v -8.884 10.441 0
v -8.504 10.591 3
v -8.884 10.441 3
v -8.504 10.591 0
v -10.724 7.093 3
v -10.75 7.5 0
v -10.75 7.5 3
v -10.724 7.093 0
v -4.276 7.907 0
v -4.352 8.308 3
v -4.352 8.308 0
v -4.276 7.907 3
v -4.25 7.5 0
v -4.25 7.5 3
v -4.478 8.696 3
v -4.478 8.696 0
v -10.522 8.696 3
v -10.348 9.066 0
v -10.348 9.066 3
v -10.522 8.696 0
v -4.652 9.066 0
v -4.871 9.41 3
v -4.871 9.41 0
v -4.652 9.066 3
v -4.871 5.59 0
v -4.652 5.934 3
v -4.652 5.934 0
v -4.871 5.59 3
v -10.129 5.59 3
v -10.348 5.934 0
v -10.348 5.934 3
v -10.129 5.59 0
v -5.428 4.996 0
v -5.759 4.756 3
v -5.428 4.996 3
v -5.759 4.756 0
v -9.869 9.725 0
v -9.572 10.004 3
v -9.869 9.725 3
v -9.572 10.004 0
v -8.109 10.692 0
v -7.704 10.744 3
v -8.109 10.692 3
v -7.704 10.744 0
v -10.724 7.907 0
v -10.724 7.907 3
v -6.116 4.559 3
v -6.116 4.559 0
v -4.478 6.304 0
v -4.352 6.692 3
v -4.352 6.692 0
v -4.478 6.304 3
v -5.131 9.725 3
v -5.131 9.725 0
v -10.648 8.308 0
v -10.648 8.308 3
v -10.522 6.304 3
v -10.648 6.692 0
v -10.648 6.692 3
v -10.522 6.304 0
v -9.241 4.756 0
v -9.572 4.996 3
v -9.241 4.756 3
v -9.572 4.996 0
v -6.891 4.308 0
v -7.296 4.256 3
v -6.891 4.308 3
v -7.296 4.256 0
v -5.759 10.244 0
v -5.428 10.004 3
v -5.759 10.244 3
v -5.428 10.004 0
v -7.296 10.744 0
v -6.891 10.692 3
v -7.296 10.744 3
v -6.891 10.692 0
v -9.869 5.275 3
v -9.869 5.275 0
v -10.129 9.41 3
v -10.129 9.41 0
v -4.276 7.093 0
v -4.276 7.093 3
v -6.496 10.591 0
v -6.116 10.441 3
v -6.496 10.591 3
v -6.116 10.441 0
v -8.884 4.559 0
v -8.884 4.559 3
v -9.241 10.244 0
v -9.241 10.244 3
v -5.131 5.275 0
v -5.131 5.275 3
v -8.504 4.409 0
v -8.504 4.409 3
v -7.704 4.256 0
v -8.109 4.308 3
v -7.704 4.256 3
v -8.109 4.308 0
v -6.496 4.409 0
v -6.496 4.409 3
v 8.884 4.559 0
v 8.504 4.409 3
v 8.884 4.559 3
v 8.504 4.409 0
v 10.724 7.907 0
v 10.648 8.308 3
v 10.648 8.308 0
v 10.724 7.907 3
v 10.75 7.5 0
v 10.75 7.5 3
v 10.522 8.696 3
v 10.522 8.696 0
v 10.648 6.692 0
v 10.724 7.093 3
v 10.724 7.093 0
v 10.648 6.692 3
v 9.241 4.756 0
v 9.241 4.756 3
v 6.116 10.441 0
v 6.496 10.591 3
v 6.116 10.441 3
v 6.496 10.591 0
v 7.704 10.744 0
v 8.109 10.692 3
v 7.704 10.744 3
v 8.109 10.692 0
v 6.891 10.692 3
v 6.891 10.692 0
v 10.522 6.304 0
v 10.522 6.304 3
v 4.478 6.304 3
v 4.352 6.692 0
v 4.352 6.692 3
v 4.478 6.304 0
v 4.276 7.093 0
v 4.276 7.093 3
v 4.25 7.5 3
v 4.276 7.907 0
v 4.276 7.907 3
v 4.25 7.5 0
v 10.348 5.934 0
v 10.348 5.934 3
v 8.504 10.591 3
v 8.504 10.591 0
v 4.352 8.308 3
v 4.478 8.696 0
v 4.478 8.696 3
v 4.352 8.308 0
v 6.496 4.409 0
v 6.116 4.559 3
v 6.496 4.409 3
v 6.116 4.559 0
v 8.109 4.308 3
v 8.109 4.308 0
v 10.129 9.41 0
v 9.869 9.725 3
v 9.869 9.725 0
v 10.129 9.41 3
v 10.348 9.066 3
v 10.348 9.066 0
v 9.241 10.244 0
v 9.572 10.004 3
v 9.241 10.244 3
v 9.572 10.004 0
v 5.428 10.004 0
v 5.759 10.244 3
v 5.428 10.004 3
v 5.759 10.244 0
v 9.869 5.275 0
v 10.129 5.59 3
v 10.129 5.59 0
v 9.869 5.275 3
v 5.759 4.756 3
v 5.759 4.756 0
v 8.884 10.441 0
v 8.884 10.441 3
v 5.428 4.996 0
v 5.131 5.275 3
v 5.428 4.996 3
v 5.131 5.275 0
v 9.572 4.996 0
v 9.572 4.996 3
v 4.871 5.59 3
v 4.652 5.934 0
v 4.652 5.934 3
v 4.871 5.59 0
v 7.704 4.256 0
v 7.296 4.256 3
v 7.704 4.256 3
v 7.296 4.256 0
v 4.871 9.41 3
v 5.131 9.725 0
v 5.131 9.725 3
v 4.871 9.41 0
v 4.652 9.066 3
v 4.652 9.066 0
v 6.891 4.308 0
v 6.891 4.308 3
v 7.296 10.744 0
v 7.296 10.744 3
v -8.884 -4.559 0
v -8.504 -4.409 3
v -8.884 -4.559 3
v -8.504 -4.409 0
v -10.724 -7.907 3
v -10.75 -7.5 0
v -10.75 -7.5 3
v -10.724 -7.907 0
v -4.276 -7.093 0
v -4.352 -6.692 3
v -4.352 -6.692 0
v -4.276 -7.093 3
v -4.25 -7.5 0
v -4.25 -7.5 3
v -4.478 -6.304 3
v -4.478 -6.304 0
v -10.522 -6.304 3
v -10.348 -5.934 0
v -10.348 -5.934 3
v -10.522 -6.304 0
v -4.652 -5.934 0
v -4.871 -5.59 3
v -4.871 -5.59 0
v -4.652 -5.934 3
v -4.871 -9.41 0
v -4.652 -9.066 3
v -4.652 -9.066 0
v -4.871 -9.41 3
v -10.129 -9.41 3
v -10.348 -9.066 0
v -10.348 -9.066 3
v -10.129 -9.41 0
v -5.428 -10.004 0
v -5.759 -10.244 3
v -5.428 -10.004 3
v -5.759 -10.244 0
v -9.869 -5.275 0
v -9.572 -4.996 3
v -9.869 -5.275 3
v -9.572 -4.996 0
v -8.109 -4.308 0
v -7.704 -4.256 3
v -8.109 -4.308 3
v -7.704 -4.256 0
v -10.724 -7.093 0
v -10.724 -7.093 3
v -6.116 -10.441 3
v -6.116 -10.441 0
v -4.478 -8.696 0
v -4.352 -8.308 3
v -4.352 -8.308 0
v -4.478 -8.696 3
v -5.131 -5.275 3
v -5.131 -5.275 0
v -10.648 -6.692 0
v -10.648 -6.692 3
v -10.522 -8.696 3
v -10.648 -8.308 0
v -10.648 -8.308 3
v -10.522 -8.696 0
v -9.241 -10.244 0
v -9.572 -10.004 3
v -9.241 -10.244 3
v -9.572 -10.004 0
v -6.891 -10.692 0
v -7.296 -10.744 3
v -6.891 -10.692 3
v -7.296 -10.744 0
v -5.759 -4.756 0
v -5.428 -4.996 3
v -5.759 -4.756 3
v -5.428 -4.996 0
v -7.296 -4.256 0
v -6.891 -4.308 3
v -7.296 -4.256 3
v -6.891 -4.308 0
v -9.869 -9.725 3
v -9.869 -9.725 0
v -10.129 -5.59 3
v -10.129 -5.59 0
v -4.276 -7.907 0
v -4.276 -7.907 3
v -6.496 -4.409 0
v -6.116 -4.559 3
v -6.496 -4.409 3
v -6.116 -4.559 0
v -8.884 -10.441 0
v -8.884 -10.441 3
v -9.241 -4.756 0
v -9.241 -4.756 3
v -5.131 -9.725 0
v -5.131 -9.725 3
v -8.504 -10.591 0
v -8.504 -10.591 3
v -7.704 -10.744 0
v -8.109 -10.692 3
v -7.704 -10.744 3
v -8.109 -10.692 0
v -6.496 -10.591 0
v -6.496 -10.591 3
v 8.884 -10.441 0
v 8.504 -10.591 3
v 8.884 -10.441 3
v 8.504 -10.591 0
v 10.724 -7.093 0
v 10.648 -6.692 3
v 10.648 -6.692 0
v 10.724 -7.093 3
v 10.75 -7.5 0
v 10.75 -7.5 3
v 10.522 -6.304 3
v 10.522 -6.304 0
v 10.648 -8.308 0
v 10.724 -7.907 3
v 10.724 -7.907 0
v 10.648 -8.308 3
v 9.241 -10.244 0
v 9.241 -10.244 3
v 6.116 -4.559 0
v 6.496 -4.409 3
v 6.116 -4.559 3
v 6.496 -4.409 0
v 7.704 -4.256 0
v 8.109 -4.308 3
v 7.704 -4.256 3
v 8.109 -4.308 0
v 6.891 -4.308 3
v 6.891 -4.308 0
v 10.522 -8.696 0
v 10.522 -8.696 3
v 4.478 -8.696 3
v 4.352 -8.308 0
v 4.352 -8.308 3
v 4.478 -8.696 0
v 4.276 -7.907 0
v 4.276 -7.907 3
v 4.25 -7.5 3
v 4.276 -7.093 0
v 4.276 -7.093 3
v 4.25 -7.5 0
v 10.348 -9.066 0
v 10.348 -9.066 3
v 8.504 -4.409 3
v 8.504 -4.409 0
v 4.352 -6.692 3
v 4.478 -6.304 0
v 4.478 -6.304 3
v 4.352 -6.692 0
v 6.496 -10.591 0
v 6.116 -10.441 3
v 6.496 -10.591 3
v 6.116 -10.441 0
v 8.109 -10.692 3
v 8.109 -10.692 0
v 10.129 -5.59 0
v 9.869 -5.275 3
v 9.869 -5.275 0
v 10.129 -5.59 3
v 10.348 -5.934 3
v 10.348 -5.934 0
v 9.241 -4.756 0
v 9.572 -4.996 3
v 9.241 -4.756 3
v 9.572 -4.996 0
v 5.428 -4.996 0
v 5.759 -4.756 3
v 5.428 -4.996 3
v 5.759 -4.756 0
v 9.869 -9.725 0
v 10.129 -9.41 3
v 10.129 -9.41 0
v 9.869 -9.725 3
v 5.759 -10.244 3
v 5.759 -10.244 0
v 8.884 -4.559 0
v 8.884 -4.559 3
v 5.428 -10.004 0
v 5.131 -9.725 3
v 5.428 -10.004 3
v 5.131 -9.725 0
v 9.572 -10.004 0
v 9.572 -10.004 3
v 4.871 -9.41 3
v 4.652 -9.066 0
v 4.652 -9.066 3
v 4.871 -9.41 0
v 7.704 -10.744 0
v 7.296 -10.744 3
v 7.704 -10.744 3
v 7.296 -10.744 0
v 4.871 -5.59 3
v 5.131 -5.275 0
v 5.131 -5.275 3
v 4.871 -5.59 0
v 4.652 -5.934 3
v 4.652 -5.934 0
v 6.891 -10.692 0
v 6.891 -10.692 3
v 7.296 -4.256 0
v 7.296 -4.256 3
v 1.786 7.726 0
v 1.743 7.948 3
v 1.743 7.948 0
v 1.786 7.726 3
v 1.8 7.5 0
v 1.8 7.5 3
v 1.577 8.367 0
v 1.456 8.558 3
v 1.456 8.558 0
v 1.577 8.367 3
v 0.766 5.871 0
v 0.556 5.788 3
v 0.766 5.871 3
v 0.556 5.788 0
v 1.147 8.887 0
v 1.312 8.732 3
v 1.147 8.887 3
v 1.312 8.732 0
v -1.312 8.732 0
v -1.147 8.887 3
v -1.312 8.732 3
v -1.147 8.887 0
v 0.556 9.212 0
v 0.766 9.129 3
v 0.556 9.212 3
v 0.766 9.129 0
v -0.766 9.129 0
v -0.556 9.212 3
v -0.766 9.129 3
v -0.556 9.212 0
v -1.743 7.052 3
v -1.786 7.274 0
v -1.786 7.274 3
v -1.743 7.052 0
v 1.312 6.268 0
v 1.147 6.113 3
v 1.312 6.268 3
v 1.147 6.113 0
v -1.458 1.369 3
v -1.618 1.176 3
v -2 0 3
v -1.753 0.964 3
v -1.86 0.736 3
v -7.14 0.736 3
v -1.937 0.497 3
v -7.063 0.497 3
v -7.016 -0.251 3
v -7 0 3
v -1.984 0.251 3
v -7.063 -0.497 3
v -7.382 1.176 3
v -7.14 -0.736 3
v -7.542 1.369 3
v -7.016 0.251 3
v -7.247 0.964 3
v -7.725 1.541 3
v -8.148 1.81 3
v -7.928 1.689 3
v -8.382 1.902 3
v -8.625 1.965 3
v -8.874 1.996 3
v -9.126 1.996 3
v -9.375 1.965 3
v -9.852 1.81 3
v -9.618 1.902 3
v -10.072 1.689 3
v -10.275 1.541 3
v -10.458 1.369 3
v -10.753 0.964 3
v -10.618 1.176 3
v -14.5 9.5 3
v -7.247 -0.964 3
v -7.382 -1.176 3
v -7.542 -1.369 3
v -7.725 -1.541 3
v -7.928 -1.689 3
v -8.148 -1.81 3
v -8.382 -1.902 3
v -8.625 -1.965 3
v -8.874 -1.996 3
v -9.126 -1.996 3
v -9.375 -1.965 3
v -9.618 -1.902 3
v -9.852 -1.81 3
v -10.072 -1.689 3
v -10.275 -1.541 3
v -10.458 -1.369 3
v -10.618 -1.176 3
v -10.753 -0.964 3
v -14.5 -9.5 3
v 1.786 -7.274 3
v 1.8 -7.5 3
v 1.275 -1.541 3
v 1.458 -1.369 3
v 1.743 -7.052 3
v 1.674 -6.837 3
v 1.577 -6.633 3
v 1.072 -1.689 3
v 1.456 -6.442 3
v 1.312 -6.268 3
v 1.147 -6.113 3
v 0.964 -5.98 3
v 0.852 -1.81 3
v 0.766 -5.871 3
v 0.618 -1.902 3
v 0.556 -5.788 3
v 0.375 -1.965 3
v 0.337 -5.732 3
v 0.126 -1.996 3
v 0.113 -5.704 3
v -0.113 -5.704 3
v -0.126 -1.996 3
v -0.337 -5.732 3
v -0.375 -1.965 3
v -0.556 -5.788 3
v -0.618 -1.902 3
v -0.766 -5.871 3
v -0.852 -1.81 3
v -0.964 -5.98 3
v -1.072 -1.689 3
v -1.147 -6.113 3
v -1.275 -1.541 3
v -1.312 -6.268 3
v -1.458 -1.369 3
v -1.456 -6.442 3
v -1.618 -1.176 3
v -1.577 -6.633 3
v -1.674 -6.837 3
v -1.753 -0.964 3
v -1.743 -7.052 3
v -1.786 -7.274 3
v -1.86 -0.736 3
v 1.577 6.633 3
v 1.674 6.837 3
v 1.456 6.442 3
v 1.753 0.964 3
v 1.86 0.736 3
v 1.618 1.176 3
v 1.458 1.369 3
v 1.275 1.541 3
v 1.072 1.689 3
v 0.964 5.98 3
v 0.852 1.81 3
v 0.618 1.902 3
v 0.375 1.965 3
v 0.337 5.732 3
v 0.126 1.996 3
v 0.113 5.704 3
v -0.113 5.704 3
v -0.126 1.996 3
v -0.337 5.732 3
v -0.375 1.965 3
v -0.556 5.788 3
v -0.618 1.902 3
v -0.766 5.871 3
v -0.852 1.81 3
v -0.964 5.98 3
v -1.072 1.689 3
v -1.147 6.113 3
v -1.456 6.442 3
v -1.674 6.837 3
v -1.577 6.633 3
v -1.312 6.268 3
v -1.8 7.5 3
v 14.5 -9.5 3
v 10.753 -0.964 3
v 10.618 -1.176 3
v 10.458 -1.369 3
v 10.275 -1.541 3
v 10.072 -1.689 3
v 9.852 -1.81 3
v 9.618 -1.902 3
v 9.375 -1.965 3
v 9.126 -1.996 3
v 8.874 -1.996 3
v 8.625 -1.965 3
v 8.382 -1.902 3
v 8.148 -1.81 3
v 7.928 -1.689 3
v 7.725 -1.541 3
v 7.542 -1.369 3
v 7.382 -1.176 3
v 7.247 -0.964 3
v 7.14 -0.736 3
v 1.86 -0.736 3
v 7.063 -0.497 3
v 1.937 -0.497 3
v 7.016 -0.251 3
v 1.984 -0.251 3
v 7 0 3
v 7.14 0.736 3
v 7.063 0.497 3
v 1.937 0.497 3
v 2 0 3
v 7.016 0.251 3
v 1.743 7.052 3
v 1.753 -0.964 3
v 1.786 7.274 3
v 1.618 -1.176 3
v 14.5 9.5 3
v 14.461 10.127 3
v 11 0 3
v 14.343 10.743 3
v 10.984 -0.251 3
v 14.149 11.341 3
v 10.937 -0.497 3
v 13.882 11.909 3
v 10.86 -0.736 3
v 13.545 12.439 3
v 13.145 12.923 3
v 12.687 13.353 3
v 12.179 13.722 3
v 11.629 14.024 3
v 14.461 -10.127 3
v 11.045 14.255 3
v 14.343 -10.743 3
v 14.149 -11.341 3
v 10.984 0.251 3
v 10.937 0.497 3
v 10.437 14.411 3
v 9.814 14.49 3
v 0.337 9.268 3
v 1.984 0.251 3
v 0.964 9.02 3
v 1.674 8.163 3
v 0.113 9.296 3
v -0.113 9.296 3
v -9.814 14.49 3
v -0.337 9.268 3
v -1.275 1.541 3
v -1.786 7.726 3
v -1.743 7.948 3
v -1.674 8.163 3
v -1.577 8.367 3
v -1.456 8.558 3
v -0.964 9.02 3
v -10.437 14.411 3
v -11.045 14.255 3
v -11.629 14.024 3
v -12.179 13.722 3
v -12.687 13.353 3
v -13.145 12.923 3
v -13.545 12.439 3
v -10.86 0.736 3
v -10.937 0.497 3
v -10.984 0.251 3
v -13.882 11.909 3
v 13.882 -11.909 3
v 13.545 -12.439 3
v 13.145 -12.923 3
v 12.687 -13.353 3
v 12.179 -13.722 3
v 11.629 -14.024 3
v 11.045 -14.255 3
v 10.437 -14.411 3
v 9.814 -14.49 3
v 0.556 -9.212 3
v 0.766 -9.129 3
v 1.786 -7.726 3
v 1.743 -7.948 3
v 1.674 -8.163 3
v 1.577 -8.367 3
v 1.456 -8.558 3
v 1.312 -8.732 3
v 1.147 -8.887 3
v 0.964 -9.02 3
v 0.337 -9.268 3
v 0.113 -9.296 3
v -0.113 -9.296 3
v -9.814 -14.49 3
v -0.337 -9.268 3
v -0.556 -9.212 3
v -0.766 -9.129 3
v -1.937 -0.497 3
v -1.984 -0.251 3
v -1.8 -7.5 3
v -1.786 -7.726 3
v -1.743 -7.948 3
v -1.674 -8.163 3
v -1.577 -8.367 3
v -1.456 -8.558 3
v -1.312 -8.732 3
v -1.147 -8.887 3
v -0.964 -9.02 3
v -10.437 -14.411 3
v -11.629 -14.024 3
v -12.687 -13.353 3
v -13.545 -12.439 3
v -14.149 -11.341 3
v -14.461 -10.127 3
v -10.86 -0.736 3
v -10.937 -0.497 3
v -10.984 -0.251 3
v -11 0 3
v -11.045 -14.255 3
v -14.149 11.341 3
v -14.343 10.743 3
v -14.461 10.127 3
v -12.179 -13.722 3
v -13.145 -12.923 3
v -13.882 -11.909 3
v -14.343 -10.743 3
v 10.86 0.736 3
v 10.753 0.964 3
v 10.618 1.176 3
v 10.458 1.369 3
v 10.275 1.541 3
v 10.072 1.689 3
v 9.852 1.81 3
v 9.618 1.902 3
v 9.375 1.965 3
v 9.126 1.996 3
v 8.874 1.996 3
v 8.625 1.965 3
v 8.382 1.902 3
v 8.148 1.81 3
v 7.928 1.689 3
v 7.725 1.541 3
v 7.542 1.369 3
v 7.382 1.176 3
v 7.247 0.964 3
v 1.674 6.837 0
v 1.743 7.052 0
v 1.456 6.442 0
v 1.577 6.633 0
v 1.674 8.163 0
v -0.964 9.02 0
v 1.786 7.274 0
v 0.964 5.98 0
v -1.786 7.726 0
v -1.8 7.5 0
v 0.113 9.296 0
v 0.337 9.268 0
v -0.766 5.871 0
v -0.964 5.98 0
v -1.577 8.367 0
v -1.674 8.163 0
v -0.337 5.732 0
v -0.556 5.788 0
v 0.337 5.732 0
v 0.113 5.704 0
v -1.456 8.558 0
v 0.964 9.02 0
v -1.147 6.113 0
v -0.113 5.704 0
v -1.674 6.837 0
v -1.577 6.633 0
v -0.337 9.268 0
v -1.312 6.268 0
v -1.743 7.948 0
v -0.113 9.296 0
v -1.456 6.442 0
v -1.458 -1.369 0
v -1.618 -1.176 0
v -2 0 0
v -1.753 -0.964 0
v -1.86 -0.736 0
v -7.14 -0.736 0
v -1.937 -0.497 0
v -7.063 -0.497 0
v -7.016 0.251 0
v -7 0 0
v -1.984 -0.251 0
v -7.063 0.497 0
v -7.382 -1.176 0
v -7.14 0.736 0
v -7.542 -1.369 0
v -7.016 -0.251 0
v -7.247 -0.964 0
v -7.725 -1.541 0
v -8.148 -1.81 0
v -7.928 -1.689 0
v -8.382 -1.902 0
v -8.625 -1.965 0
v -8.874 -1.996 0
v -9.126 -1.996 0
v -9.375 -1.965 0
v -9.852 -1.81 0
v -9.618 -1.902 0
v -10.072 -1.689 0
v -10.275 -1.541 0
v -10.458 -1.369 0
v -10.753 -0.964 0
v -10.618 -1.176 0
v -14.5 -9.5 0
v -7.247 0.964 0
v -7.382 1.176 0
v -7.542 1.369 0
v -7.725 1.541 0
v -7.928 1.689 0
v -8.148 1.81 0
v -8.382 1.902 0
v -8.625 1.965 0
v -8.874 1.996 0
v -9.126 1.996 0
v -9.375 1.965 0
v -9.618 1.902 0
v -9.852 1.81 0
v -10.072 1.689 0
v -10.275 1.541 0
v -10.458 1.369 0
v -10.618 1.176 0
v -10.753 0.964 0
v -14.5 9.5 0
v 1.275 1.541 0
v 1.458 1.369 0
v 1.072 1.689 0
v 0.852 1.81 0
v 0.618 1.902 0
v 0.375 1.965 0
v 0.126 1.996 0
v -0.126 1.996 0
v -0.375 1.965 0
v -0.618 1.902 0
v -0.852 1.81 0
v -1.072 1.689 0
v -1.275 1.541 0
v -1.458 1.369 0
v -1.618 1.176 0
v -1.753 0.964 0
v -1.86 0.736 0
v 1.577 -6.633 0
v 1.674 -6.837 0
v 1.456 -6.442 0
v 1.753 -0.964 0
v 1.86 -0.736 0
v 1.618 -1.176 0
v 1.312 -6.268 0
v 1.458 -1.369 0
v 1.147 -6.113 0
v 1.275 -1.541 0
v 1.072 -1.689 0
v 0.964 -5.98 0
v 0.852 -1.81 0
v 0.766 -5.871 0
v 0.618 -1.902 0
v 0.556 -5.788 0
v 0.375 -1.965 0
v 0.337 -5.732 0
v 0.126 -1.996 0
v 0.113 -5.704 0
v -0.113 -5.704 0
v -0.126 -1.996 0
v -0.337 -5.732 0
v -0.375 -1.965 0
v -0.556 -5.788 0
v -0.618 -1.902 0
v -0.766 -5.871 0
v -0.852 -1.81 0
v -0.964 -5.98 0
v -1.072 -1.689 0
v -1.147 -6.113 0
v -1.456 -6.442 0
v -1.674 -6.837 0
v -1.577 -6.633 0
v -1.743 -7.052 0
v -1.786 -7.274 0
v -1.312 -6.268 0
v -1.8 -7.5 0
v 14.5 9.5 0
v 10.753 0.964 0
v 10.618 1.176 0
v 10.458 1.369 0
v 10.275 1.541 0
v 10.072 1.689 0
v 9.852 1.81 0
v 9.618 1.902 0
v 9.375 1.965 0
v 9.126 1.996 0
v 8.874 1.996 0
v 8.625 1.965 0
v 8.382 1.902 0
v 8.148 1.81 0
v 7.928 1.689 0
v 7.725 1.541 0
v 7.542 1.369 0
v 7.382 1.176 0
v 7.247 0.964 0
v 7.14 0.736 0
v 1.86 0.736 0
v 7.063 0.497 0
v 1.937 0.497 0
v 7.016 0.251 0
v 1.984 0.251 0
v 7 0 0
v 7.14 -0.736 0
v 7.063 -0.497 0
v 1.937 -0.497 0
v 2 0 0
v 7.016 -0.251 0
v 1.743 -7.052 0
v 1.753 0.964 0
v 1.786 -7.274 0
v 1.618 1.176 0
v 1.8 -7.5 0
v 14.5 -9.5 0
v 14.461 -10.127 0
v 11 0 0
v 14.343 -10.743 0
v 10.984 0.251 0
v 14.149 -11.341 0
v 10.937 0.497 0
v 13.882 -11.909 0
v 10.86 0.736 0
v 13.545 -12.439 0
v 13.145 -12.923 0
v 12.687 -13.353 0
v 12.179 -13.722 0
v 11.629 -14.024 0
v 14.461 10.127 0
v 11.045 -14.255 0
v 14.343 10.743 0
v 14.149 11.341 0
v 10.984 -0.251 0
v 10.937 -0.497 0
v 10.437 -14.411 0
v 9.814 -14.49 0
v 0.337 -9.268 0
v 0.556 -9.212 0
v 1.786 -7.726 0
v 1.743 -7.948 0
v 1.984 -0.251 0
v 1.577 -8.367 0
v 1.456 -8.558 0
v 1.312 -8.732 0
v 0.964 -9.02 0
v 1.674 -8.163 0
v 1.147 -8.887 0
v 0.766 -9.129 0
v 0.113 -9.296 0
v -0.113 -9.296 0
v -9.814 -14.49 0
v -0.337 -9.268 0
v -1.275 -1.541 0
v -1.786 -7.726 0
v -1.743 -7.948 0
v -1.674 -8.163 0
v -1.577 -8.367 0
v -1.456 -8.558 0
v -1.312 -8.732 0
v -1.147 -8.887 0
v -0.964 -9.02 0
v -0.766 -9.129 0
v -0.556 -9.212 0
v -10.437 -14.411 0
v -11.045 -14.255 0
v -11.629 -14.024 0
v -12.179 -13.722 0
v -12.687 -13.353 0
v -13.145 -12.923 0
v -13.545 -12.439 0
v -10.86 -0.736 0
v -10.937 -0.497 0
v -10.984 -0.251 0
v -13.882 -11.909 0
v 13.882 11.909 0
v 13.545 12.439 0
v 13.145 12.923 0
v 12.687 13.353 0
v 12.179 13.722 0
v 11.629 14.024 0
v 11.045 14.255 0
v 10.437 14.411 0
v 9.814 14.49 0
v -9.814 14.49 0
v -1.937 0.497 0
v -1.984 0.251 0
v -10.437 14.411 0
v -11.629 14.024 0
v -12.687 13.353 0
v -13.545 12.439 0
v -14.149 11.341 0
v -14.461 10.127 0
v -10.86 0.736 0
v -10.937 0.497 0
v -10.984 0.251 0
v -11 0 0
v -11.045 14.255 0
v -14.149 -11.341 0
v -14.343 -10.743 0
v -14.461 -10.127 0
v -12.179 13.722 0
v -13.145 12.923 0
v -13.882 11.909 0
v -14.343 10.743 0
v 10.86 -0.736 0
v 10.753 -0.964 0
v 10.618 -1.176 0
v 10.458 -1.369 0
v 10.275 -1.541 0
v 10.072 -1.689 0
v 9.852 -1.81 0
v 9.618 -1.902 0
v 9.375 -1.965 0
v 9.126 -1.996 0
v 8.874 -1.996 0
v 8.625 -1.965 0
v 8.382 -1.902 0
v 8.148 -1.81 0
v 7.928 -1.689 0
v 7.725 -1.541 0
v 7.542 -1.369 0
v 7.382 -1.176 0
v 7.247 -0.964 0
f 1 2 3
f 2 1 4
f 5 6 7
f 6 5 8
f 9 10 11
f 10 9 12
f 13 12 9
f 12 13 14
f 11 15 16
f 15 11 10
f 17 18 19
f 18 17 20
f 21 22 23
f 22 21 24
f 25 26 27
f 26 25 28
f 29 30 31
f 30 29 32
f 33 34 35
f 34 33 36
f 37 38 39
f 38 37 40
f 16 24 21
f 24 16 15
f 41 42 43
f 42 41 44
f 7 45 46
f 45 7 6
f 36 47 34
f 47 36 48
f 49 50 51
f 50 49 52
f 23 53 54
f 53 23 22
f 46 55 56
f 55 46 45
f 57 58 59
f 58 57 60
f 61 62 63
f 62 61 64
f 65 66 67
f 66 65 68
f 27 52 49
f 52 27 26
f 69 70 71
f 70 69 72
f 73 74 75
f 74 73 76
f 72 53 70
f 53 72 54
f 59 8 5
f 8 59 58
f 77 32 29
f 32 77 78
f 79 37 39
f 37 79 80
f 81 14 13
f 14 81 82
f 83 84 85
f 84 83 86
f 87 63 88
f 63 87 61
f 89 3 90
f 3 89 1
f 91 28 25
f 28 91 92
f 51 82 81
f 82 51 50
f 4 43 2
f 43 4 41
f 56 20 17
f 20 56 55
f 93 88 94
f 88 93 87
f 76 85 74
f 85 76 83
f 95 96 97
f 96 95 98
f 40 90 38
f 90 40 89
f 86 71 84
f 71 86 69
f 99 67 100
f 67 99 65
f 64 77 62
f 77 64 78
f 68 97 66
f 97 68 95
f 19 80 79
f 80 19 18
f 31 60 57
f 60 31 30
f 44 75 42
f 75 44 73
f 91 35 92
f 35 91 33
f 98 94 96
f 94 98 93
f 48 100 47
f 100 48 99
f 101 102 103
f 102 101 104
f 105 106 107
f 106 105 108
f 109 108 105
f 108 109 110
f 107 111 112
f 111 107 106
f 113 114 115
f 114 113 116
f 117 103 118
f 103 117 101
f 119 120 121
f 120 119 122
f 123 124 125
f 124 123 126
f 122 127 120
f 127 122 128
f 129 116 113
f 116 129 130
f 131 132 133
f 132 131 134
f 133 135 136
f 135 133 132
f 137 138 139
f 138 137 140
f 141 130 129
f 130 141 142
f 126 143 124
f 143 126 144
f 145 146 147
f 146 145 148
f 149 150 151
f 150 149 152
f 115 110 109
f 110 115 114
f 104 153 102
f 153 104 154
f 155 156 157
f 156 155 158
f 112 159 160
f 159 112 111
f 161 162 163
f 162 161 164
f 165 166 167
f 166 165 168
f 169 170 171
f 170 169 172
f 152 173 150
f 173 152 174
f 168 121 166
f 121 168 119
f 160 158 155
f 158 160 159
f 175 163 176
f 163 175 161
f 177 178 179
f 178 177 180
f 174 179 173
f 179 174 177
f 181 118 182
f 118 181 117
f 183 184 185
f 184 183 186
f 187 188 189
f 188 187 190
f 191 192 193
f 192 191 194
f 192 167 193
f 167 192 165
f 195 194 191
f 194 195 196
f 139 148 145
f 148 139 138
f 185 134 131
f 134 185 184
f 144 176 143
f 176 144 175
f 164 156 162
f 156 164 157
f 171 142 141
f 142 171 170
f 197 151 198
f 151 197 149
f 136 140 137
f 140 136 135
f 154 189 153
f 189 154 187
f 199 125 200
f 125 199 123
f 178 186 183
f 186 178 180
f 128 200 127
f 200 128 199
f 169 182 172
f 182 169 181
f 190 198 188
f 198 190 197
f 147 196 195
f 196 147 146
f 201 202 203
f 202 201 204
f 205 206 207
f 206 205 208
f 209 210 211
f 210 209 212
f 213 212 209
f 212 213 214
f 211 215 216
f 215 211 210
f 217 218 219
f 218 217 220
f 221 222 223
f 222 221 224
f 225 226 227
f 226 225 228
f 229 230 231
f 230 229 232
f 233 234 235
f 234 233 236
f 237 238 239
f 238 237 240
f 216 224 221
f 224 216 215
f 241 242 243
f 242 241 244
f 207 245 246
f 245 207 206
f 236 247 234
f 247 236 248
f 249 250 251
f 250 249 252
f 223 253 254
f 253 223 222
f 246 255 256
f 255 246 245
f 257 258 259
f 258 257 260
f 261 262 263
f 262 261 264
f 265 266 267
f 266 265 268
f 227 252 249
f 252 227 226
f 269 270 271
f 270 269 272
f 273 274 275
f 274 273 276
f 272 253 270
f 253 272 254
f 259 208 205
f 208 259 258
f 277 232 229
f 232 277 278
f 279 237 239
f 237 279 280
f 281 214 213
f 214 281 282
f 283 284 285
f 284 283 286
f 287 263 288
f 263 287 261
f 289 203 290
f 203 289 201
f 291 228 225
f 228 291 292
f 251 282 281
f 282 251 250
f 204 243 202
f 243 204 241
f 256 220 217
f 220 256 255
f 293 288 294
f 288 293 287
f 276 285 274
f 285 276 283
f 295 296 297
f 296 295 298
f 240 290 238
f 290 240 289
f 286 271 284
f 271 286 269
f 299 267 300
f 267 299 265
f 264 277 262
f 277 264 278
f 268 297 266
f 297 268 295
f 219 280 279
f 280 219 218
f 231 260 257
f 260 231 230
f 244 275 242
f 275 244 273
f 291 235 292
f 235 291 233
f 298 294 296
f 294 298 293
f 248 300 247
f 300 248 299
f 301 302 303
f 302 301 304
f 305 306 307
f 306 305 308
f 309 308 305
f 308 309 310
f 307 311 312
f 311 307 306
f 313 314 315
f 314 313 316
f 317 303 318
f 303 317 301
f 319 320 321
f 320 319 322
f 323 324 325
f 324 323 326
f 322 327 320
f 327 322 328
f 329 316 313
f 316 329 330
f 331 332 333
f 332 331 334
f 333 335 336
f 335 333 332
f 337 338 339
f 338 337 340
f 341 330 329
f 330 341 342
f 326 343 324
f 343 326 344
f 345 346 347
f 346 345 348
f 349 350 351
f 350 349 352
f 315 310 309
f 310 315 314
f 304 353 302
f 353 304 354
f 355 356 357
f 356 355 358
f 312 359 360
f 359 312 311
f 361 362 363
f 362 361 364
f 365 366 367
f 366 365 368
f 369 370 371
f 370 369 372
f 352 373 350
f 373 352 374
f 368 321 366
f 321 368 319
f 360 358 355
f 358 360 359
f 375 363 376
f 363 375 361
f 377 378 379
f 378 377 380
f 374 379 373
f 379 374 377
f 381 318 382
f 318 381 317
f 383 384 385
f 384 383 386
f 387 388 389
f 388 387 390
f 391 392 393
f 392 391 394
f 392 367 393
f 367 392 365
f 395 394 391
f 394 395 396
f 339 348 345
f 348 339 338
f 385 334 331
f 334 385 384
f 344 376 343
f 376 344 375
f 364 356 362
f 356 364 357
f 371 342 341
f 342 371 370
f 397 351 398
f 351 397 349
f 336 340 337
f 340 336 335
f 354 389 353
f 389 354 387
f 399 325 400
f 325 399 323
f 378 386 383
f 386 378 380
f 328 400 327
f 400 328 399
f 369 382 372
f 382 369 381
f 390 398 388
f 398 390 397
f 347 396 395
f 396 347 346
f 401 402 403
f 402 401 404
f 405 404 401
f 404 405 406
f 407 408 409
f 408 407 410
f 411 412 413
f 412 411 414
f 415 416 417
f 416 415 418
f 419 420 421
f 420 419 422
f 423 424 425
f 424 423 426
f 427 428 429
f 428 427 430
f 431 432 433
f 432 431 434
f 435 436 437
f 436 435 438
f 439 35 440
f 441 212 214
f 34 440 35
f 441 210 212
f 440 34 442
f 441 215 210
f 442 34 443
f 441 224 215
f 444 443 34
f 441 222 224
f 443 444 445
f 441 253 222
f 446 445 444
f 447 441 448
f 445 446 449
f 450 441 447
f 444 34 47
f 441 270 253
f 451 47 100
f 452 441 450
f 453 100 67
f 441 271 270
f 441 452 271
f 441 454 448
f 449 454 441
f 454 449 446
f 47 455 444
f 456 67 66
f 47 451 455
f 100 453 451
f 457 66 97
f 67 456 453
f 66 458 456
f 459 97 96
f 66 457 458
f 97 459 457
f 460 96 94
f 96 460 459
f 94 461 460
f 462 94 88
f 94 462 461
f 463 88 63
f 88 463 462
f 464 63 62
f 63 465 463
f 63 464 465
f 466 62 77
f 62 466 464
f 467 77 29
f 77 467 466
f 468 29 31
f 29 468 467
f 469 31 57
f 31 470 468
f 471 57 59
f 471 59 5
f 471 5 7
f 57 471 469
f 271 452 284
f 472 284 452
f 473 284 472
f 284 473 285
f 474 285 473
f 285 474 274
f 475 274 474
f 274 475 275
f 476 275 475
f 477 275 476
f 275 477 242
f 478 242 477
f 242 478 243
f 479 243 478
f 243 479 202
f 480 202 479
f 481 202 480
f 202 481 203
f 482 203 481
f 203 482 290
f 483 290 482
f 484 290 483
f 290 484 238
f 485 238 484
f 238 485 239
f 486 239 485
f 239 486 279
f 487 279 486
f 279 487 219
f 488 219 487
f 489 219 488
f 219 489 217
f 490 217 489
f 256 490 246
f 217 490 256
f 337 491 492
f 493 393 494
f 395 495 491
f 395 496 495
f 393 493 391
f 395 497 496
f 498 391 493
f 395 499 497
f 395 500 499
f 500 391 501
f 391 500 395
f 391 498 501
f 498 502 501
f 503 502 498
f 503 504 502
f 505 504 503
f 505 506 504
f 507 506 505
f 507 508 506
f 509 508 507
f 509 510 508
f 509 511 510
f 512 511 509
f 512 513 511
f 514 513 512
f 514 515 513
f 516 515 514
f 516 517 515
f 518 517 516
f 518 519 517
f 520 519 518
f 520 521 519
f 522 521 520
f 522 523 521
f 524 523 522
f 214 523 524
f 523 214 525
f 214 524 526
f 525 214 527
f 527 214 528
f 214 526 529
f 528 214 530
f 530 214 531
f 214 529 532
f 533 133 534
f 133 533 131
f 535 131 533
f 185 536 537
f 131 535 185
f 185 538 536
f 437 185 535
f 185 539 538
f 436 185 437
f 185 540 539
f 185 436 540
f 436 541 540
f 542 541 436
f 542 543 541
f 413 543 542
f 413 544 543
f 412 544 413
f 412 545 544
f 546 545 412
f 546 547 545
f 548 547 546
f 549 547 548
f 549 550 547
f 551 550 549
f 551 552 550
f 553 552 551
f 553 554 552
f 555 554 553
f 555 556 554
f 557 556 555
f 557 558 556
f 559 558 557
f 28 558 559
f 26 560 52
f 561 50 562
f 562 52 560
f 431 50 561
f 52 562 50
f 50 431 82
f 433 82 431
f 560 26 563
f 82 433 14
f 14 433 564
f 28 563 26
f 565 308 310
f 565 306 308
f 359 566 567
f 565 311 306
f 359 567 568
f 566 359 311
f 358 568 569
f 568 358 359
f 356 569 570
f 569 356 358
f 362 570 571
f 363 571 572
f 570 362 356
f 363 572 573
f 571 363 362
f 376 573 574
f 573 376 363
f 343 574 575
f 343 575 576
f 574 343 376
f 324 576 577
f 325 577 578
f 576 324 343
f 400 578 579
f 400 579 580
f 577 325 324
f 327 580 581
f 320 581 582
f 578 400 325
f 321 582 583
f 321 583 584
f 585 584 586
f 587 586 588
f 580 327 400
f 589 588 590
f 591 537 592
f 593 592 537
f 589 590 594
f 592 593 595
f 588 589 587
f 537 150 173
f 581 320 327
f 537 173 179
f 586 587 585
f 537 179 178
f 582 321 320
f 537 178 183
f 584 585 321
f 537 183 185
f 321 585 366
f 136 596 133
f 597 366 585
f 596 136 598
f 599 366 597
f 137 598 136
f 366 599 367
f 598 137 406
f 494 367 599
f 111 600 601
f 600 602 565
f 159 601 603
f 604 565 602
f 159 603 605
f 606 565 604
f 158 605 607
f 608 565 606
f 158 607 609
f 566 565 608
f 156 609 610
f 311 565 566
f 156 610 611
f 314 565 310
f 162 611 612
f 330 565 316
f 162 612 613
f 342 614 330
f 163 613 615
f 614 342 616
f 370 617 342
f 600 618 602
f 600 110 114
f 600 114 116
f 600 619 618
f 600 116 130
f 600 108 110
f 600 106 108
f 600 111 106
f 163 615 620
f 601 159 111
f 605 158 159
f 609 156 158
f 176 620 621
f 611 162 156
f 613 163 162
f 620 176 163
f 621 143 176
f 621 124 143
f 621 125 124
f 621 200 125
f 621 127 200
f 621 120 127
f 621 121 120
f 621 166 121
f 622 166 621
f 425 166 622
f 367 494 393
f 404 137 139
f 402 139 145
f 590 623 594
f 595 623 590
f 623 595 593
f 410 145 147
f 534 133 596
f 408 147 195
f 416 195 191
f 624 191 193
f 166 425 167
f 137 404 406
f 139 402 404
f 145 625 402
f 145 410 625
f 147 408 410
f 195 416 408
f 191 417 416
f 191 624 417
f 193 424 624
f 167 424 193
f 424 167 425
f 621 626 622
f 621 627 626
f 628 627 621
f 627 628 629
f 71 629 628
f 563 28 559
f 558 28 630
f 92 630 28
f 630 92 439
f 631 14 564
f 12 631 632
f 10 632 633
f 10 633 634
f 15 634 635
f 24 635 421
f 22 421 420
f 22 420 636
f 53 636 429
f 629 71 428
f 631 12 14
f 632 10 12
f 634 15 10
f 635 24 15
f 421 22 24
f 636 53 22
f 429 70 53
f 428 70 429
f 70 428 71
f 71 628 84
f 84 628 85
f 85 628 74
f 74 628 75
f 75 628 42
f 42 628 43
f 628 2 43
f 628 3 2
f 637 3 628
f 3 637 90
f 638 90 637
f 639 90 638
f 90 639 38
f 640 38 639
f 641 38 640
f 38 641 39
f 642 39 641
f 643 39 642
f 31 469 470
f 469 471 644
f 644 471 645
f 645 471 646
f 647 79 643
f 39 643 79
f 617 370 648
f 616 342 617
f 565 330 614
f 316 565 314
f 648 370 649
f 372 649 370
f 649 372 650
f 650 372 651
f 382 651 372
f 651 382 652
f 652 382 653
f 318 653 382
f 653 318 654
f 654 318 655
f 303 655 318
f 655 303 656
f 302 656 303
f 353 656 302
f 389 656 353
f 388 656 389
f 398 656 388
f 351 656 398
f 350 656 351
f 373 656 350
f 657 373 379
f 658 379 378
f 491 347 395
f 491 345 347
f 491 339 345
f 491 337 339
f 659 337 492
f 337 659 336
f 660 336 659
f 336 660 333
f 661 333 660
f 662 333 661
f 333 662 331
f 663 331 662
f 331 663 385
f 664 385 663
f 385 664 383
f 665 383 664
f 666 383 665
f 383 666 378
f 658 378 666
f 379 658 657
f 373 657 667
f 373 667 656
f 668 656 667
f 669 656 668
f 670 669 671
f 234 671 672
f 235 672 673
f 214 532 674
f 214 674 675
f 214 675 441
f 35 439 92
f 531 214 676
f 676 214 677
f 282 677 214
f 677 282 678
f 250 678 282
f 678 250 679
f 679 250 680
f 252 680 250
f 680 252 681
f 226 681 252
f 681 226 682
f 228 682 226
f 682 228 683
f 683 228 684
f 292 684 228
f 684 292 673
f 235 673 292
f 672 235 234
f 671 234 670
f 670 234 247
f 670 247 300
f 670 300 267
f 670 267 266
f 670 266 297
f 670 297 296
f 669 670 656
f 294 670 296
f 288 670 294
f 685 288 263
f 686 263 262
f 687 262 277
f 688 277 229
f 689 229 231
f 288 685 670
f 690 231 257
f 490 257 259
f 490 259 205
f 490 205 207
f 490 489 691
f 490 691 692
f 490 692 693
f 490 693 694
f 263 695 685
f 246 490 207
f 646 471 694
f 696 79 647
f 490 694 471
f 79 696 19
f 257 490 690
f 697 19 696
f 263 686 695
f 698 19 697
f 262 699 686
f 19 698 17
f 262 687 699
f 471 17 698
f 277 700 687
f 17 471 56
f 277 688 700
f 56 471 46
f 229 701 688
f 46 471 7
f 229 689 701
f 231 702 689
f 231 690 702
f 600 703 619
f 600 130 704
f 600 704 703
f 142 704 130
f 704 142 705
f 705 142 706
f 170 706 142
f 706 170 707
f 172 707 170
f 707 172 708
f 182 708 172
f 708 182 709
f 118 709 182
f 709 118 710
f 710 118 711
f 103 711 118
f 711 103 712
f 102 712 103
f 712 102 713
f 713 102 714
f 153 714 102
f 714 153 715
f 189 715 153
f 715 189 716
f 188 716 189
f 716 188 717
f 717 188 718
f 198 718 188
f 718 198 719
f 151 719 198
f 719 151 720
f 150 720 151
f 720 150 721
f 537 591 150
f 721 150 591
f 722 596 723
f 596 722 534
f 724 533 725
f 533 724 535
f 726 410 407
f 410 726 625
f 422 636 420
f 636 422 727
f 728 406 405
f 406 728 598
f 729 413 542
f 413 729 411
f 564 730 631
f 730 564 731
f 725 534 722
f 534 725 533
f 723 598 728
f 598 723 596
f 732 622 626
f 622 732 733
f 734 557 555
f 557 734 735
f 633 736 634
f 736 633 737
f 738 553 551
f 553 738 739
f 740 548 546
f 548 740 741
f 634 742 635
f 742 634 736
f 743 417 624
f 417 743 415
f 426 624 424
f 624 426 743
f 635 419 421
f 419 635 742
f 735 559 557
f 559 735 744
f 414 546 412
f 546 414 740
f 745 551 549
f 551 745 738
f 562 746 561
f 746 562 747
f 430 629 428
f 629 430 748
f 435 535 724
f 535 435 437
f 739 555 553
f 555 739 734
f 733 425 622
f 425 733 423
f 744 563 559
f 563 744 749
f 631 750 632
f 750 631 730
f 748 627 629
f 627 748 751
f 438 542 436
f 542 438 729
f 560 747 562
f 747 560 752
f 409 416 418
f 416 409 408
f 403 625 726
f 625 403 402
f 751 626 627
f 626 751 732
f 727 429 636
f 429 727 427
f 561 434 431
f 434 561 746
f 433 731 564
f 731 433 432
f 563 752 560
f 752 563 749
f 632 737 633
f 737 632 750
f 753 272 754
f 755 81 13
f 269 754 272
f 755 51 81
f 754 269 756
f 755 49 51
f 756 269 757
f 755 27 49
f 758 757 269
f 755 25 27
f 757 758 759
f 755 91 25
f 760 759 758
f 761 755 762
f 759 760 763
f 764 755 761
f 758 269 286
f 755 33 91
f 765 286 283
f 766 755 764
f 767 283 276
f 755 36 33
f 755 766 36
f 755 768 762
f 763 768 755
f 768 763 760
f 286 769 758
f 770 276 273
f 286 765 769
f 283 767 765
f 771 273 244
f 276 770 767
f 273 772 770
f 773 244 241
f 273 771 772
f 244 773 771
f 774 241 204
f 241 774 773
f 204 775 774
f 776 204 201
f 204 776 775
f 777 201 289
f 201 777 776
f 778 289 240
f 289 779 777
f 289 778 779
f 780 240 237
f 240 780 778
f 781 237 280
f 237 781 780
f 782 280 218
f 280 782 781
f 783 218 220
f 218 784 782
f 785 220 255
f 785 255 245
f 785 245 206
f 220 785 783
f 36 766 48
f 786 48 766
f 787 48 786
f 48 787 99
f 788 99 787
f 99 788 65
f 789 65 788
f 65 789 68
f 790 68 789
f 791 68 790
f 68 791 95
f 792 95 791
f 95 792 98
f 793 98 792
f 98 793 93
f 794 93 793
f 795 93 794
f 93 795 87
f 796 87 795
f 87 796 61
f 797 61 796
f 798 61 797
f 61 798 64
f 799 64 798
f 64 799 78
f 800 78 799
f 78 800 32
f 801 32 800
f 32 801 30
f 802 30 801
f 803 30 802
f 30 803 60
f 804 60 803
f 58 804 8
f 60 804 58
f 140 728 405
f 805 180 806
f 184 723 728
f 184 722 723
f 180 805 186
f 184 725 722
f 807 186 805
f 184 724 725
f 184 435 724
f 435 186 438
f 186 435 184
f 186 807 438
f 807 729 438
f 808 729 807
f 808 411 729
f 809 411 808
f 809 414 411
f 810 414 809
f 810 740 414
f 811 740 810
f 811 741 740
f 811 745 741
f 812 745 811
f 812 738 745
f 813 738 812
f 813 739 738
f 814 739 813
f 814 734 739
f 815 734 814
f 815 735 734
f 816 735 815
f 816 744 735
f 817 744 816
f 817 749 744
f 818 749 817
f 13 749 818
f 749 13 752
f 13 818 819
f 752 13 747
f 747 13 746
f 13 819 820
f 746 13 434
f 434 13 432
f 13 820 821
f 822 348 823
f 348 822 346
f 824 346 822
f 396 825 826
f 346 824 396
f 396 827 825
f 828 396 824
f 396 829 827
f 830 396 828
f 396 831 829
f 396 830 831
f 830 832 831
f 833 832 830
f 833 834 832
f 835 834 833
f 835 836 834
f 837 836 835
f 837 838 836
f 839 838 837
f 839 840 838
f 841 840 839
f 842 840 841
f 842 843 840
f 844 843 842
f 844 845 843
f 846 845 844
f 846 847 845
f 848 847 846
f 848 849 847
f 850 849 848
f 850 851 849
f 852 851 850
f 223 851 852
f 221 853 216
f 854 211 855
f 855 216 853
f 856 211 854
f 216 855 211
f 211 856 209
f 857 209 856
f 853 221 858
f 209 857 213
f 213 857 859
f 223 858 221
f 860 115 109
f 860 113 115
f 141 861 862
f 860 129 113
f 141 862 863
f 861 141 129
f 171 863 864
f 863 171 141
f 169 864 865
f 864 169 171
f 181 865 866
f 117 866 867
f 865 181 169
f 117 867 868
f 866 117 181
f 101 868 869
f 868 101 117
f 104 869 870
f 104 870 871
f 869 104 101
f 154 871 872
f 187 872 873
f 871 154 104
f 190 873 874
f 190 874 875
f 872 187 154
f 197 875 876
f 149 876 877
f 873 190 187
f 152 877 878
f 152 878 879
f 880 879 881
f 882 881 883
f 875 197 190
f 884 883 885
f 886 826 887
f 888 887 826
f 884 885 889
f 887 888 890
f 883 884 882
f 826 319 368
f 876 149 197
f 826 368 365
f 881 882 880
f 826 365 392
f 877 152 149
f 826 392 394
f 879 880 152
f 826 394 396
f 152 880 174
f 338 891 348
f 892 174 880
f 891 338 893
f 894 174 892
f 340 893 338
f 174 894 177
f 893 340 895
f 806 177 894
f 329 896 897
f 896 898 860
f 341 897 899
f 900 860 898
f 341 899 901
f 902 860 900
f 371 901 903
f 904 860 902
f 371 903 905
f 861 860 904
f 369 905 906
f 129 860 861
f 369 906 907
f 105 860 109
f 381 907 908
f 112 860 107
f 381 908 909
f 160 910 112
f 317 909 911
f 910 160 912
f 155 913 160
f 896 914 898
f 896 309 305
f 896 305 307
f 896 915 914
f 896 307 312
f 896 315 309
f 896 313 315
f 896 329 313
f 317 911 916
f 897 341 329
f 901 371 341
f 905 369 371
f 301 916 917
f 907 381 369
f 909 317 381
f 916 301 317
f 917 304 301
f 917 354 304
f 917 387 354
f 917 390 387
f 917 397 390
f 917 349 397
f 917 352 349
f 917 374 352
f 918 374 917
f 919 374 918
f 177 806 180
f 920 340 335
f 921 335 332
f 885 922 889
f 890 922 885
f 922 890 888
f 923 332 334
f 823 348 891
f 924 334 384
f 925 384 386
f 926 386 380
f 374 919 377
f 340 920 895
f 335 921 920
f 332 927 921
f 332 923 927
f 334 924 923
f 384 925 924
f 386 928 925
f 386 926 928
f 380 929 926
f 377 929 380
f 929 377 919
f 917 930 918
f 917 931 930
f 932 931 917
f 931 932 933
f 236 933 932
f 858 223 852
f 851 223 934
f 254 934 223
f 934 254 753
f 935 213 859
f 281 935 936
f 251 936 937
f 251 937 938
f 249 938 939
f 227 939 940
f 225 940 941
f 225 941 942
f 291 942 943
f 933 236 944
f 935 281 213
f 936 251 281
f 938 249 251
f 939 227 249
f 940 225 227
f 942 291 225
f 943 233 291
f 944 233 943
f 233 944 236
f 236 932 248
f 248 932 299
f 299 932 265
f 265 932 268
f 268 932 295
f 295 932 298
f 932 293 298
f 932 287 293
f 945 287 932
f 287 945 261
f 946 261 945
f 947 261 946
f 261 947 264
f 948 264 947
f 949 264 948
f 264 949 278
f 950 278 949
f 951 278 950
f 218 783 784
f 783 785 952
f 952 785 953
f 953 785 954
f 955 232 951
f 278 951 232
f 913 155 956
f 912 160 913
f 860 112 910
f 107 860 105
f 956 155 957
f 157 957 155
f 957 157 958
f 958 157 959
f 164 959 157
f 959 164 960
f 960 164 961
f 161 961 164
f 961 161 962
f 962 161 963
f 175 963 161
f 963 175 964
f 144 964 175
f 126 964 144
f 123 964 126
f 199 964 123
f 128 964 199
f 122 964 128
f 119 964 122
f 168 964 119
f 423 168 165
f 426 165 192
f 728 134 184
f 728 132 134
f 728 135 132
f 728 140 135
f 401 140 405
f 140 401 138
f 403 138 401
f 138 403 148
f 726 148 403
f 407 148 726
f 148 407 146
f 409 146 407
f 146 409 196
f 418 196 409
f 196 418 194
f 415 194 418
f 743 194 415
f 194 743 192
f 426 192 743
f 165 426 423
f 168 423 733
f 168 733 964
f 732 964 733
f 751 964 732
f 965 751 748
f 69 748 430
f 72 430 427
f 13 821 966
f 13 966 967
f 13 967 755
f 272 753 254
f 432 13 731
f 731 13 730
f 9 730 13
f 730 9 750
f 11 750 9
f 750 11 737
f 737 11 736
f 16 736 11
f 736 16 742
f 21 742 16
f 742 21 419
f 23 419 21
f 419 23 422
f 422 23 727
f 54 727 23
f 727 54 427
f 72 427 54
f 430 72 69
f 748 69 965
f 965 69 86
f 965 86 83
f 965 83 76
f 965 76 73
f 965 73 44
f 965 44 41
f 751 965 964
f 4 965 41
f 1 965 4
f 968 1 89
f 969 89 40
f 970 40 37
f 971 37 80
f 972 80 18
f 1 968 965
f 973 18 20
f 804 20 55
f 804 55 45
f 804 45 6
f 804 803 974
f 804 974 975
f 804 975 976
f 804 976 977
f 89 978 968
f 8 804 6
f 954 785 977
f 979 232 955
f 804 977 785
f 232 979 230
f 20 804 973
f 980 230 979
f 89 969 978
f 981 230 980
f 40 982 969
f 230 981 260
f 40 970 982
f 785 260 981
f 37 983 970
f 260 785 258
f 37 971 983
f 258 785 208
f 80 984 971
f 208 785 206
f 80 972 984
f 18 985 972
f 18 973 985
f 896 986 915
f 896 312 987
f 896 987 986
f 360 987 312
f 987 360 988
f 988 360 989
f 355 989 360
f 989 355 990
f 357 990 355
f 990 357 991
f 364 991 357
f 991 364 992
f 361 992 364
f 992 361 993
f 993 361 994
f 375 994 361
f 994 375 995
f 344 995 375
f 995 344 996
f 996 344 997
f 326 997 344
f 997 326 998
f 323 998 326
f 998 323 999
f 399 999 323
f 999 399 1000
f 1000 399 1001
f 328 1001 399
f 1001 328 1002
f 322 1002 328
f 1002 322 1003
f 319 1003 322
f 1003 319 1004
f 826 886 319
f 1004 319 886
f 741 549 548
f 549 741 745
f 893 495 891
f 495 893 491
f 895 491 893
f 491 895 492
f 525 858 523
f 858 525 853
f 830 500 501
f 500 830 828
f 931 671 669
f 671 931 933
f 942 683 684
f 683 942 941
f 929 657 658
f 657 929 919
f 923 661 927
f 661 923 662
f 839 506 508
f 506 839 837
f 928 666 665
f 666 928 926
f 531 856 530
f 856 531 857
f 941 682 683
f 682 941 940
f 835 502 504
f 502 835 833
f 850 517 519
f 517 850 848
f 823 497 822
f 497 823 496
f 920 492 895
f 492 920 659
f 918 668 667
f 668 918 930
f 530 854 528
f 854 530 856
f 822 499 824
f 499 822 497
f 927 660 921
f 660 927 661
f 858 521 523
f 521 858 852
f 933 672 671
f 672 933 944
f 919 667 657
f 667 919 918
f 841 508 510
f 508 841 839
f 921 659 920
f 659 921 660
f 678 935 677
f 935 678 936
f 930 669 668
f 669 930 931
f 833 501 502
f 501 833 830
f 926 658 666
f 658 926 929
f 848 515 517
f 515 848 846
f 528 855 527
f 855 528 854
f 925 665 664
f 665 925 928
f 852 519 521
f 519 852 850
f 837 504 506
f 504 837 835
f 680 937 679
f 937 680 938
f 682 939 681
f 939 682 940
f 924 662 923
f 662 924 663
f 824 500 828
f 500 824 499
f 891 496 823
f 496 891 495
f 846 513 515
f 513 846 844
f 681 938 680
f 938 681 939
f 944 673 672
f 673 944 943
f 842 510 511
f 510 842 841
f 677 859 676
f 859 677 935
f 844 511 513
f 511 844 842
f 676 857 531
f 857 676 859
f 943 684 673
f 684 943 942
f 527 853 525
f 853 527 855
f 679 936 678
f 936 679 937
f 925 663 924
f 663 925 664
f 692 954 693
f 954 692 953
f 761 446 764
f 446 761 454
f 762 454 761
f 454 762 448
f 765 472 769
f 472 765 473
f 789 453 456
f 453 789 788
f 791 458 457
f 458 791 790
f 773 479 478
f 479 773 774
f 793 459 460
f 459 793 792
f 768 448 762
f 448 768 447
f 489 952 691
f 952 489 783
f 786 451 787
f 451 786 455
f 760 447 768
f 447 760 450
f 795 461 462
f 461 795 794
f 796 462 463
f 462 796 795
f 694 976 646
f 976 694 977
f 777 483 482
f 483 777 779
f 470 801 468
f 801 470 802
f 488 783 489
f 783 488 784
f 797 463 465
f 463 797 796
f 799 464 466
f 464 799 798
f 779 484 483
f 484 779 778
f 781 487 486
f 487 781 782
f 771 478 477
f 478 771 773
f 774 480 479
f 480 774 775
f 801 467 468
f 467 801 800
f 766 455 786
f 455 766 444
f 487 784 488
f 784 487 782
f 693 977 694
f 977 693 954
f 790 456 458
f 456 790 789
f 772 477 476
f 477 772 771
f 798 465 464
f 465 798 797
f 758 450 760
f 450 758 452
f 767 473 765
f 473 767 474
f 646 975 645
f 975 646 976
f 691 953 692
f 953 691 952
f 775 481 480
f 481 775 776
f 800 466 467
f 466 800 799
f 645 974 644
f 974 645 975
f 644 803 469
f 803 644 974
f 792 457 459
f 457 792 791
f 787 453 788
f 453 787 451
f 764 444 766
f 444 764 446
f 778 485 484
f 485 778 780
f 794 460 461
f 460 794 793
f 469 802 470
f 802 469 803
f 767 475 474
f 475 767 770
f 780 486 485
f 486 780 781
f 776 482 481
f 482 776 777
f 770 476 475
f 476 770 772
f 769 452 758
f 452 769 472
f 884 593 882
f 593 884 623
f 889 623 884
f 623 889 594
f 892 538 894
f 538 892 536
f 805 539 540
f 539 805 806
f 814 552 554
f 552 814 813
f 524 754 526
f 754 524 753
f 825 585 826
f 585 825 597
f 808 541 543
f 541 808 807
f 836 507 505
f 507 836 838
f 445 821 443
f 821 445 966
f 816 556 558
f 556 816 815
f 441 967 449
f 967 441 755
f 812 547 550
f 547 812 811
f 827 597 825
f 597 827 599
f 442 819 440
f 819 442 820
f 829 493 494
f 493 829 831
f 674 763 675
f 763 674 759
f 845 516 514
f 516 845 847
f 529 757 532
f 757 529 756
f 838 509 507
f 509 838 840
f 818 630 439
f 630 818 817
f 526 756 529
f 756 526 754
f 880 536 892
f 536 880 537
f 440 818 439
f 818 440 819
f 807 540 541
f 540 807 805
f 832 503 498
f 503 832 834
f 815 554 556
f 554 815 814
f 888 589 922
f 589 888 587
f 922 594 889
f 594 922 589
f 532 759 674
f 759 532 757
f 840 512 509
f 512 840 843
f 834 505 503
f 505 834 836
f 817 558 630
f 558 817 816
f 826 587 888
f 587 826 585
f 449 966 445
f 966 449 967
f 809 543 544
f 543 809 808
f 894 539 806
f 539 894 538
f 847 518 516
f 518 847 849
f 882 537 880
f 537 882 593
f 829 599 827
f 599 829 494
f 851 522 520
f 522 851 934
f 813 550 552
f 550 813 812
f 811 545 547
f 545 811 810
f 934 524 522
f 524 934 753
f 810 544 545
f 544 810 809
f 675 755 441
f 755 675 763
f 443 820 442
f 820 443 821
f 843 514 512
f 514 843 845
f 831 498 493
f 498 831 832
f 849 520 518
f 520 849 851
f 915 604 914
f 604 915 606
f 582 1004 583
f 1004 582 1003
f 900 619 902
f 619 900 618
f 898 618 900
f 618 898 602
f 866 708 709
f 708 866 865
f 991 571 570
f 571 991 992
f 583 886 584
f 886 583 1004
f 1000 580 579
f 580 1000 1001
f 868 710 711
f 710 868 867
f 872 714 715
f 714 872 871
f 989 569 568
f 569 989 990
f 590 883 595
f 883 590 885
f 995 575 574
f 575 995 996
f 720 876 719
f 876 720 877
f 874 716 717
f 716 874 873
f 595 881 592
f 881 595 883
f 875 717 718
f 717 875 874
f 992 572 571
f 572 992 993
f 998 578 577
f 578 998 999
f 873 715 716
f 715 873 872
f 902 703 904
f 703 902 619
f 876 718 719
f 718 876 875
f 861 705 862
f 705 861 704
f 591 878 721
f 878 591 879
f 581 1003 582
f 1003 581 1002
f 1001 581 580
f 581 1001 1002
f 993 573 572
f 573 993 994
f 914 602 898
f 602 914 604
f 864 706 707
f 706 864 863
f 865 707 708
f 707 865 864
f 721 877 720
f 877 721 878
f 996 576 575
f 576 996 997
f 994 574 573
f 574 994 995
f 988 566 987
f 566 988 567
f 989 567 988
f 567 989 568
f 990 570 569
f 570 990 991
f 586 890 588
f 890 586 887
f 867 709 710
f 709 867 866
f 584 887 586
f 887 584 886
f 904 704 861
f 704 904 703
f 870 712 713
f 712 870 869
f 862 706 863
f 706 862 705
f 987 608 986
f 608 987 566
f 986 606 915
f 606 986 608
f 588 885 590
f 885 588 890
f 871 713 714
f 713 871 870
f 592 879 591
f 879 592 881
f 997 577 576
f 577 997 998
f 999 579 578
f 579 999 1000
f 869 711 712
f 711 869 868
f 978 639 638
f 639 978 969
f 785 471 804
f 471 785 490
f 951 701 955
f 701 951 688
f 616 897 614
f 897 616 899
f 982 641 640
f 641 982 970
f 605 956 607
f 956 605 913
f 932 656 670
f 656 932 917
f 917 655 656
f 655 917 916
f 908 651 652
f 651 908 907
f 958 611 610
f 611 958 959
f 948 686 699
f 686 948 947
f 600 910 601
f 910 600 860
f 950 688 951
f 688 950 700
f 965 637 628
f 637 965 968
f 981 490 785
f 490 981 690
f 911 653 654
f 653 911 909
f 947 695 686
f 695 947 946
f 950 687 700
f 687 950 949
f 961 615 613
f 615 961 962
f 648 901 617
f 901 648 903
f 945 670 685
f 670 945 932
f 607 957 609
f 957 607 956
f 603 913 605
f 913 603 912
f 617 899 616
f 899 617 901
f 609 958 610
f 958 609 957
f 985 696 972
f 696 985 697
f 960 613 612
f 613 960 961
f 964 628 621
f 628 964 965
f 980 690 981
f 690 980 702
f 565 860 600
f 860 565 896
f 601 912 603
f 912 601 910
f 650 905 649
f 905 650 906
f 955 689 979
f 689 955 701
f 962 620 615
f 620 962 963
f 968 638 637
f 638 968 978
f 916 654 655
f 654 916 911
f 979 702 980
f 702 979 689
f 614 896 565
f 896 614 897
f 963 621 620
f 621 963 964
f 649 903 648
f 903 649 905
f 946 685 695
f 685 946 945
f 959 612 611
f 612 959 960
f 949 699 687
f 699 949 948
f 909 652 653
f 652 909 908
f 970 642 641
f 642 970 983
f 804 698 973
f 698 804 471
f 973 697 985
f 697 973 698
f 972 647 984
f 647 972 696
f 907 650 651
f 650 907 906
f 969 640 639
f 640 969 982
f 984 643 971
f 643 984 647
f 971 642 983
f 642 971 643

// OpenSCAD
$fn = 50;


difference() {
	union() {
		hull() {
			translate(v = [-9.5000000000, 9.5000000000, 0]) {
				cylinder(h = 3, r = 5);
			}
			translate(v = [9.5000000000, 9.5000000000, 0]) {
				cylinder(h = 3, r = 5);
			}
			translate(v = [-9.5000000000, -9.5000000000, 0]) {
				cylinder(h = 3, r = 5);
			}
			translate(v = [9.5000000000, -9.5000000000, 0]) {
				cylinder(h = 3, r = 5);
			}
		}
	}
	union() {
		#translate(v = [-7.5000000000, 7.5000000000, 0]) {
			cylinder(h = 3, r = 3.2500000000);
		}
		#translate(v = [7.5000000000, 7.5000000000, 0]) {
			cylinder(h = 3, r = 3.2500000000);
		}
		#translate(v = [-7.5000000000, -7.5000000000, 0]) {
			cylinder(h = 3, r = 3.2500000000);
		}
		#translate(v = [7.5000000000, -7.5000000000, 0]) {
			cylinder(h = 3, r = 3.2500000000);
		}
		#translate(v = [-7.5000000000, -7.5000000000, -100.0000000000]) {
			cylinder(h = 200, r = 3.2500000000);
		}
		#translate(v = [-7.5000000000, 7.5000000000, -100.0000000000]) {
			cylinder(h = 200, r = 3.2500000000);
		}
		#translate(v = [7.5000000000, -7.5000000000, -100.0000000000]) {
			cylinder(h = 200, r = 3.2500000000);
		}
		#translate(v = [7.5000000000, 7.5000000000, -100.0000000000]) {
			cylinder(h = 200, r = 3.2500000000);
		}
		#translate(v = [-7.5000000000, 7.5000000000, 0]) {
			cylinder(h = 3, r = 1.8000000000);
		}
		#translate(v = [0.0000000000, 7.5000000000, 0]) {
			cylinder(h = 3, r = 1.8000000000);
		}
		#translate(v = [7.5000000000, 7.5000000000, 0]) {
			cylinder(h = 3, r = 1.8000000000);
		}
		#translate(v = [-7.5000000000, -7.5000000000, 0]) {
			cylinder(h = 3, r = 1.8000000000);
		}
		#translate(v = [0.0000000000, -7.5000000000, 0]) {
			cylinder(h = 3, r = 1.8000000000);
		}
		#translate(v = [7.5000000000, -7.5000000000, 0]) {
			cylinder(h = 3, r = 1.8000000000);
		}
		#translate(v = [-7.5000000000, 7.5000000000, 0]) {
			cylinder(h = 3, r = 1.8000000000);
		}
		#translate(v = [0.0000000000, 7.5000000000, 0]) {
			cylinder(h = 3, r = 1.8000000000);
		}
		#translate(v = [7.5000000000, 7.5000000000, 0]) {
			cylinder(h = 3, r = 1.8000000000);
		}
		#translate(v = [-7.5000000000, -7.5000000000, 0]) {
			cylinder(h = 3, r = 1.8000000000);
		}
		#translate(v = [0.0000000000, -7.5000000000, 0]) {
			cylinder(h = 3, r = 1.8000000000);
		}
		#translate(v = [7.5000000000, -7.5000000000, 0]) {
			cylinder(h = 3, r = 1.8000000000);
		}
		#translate(v = [-7.5000000000, 7.5000000000, 0]) {
			cylinder(h = 3, r = 1.8000000000);
		}
		#translate(v = [0.0000000000, 7.5000000000, 0]) {
			cylinder(h = 3, r = 1.8000000000);
		}
		#translate(v = [7.5000000000, 7.5000000000, 0]) {
			cylinder(h = 3, r = 1.8000000000);
		}
		#translate(v = [-7.5000000000, -7.5000000000, 0]) {
			cylinder(h = 3, r = 1.8000000000);
		}
		#translate(v = [0.0000000000, -7.5000000000, 0]) {
			cylinder(h = 3, r = 1.8000000000);
		}
		#translate(v = [7.5000000000, -7.5000000000, 0]) {
			cylinder(h = 3, r = 1.8000000000);
		}
		#translate(v = [-9.0000000000, 0, 0]) {
			cylinder(h = 3, r = 2.0000000000);
		}
		#cylinder(h = 3, r = 2.0000000000);
		#translate(v = [9.0000000000, 0, 0]) {
			cylinder(h = 3, r = 2.0000000000);
		}
	}
}
